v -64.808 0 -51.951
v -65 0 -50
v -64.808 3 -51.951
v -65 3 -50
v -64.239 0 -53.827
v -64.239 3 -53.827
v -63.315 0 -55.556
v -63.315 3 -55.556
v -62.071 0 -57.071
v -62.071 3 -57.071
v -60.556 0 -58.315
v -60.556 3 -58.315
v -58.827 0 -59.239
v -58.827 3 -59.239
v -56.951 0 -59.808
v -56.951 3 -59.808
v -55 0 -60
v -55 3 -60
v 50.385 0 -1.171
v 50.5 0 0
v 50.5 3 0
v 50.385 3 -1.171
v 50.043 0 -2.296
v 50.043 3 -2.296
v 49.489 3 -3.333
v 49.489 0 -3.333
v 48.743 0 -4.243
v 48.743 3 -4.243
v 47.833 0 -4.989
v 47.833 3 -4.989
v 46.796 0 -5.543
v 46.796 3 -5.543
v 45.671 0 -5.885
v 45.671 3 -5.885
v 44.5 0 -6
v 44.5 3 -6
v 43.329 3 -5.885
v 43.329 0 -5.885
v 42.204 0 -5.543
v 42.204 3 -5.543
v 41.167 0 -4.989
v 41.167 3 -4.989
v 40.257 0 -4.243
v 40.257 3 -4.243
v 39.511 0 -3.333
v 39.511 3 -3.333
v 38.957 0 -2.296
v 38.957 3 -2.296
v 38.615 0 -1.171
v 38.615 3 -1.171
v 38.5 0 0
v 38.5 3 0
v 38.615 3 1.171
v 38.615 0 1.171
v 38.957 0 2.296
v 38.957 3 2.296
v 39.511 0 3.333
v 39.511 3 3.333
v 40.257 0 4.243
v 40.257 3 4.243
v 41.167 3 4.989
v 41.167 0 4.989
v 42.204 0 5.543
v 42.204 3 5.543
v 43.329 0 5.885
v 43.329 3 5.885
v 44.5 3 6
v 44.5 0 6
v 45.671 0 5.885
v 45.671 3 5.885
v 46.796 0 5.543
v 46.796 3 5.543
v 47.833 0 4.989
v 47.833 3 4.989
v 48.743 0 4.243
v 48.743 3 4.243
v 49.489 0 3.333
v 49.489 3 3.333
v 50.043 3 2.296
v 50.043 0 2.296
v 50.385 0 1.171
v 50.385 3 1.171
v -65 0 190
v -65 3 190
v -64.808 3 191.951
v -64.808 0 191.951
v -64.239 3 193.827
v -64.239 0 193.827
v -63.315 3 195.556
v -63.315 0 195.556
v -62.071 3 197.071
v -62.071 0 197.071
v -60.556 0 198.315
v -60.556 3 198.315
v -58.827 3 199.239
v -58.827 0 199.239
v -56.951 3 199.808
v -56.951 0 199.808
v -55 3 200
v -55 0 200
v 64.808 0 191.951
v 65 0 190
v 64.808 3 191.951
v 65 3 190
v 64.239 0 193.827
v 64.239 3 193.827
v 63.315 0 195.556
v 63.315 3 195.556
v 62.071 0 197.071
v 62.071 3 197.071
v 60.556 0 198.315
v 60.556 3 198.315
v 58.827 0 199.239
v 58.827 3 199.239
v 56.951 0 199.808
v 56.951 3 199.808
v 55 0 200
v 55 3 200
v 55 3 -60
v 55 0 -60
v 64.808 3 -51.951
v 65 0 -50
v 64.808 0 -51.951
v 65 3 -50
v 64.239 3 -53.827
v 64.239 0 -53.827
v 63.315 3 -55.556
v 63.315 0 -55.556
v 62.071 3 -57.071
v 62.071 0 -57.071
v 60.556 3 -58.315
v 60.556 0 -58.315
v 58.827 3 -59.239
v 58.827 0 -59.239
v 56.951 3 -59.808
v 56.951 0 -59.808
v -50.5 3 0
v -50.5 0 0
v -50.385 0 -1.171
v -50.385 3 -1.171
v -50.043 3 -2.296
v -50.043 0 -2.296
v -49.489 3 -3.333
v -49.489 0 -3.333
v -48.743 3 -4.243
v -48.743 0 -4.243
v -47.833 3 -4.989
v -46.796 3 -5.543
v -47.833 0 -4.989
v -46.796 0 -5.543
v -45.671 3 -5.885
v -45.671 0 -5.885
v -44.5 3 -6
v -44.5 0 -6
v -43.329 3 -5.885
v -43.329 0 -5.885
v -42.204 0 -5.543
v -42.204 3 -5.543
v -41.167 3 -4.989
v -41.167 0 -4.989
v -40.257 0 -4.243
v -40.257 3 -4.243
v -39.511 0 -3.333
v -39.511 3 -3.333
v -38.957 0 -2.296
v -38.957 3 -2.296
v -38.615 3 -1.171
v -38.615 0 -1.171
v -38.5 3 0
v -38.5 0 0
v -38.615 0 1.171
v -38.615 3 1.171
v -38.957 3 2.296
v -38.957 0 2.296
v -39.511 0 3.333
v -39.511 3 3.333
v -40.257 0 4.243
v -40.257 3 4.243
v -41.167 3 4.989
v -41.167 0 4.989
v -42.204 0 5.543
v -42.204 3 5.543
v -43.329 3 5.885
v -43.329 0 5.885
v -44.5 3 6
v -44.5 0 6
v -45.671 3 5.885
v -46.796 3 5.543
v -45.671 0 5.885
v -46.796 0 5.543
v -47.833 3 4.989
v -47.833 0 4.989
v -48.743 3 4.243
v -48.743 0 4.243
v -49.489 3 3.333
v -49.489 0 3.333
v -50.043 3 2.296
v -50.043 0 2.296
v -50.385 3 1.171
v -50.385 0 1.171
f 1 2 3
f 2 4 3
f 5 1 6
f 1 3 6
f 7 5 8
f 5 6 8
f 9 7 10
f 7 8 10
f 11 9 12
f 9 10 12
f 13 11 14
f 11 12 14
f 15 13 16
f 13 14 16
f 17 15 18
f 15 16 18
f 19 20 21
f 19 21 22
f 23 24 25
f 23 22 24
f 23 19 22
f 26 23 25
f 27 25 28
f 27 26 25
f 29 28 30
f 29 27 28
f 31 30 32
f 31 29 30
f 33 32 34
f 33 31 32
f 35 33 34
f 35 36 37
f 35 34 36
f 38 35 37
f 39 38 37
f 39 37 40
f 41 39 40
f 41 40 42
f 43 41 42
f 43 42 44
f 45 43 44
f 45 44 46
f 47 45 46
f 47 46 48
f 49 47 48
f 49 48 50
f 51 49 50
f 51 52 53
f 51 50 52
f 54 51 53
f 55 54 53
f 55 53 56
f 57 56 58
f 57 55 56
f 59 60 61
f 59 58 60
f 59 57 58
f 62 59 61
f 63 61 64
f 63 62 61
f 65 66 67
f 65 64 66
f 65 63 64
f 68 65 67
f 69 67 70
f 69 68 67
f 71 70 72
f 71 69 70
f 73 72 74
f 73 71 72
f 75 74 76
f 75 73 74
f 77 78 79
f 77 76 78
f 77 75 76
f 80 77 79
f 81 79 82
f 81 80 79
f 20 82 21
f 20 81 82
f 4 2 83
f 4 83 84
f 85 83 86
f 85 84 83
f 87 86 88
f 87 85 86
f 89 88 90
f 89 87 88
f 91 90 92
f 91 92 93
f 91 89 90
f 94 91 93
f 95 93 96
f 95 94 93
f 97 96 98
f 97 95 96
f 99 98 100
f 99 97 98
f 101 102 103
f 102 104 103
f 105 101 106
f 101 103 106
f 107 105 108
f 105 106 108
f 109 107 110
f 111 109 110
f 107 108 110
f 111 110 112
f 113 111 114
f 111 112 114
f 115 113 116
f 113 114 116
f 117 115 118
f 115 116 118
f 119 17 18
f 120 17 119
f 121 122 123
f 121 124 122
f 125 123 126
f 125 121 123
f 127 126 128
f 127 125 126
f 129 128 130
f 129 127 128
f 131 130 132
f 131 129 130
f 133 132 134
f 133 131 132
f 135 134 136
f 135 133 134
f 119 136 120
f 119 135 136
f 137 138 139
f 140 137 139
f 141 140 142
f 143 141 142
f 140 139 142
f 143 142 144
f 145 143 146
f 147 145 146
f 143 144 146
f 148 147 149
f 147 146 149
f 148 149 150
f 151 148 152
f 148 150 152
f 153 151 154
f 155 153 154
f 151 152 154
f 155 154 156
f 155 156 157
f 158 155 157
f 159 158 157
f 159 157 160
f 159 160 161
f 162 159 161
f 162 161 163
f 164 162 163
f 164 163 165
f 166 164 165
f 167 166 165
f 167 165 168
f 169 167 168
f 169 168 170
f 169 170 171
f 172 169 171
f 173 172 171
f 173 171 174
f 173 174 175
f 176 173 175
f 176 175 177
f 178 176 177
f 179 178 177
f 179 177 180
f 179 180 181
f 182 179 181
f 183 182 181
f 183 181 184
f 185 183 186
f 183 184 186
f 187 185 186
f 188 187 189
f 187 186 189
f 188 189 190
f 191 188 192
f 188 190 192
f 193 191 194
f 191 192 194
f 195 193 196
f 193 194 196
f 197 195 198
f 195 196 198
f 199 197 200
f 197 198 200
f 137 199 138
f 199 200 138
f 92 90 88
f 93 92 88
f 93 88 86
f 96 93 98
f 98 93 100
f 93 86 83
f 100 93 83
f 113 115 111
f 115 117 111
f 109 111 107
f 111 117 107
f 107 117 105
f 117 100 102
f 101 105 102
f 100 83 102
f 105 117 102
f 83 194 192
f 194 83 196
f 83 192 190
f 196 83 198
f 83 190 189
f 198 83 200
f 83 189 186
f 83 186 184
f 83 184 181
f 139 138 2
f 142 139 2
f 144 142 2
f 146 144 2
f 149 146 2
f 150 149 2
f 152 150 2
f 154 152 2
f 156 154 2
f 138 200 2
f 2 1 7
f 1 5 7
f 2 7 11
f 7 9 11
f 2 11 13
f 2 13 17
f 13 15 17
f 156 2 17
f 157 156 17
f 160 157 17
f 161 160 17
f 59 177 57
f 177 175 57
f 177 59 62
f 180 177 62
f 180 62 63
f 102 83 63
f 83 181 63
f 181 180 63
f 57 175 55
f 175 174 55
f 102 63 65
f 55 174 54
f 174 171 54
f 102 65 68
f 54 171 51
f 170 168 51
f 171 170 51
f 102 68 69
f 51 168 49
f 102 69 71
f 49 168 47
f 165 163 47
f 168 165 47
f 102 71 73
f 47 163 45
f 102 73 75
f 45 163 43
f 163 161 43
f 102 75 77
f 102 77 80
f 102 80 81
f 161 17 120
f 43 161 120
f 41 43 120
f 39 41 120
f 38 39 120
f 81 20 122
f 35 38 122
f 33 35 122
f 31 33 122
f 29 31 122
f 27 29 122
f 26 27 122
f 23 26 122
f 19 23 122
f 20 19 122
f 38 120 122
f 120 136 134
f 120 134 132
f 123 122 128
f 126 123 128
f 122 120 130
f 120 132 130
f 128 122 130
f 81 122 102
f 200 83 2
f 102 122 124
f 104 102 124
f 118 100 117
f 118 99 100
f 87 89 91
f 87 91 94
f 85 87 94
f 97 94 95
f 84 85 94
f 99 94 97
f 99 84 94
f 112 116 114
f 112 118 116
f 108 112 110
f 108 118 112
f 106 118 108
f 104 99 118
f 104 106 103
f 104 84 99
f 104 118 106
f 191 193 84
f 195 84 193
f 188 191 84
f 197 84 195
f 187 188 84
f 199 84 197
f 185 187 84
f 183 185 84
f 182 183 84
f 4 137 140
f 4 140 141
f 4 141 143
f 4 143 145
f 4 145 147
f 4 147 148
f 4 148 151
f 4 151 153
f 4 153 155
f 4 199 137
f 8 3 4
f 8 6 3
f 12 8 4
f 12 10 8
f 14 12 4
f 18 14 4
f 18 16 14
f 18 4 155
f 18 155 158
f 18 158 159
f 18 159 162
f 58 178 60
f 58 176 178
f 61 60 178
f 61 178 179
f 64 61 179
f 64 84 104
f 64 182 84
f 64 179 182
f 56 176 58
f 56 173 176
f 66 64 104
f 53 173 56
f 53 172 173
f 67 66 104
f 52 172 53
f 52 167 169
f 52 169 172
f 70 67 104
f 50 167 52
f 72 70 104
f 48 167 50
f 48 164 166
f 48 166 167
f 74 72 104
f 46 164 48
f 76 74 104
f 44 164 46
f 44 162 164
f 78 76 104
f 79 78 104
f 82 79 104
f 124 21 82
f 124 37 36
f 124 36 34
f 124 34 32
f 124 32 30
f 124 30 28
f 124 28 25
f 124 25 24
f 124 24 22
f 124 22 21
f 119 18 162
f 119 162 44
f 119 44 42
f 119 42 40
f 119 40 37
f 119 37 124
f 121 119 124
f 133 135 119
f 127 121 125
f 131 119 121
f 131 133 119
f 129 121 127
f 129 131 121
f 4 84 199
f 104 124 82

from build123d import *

# Parameters (mm, degrees)
SKETCH1_W           = 130
SKETCH1_H           = 120
BOSS_EXTRUDE1_DEPTH = 3
CUT_EXTRUDE1_START  = -4
SKETCH2_R           = 6
CUT_EXTRUDE1_DEPTH  = 5
SKETCH3_W           = 130
SKETCH3_H           = 3
BOSS_EXTRUDE2_DEPTH = 140
FILLET1_R           = 10


with BuildPart() as part:
    # Sketch1 → Boss-Extrude1 (new body)
    with BuildSketch(Plane(origin=(0, 0, 0), x_dir=(1, 0, 0), z_dir=(0, 1, 0))):
        Rectangle(SKETCH1_W, SKETCH1_H)
    extrude(amount=BOSS_EXTRUDE1_DEPTH)

    # Sketch2 → Cut-Extrude1 (cut)
    with BuildSketch(Plane(origin=(0, 3, 0), x_dir=(1, 0, 0), z_dir=(0, 1, 0)).offset(CUT_EXTRUDE1_START)):
        with Locations((44.5, 0)):
            Circle(SKETCH2_R)
    cut_extrude1 = extrude(amount=CUT_EXTRUDE1_DEPTH, mode=Mode.SUBTRACT)

    # Mirror1: Cut-Extrude1 across plane
    add(cut_extrude1.mirror(Plane(origin=(0, 0, 0), x_dir=(0, 0, 1), z_dir=(1, 0, 0))), mode=Mode.SUBTRACT)

    # Sketch3 → Boss-Extrude2 (add)
    with BuildSketch(Plane.XY.offset(60)):
        with Locations((0, 1.5)):
            Rectangle(SKETCH3_W, SKETCH3_H)
    extrude(amount=BOSS_EXTRUDE2_DEPTH)

    # Fillet1
    fillet1_edges = [part.edges().sort_by_distance(p)[0] for p in [
        (-65, 1.5, 200),
        (65, 1.5, 200),
        (-65, 1.5, -60),
        (65, 1.5, -60),
    ]]
    fillet(fillet1_edges, radius=FILLET1_R)


solid = part.part
